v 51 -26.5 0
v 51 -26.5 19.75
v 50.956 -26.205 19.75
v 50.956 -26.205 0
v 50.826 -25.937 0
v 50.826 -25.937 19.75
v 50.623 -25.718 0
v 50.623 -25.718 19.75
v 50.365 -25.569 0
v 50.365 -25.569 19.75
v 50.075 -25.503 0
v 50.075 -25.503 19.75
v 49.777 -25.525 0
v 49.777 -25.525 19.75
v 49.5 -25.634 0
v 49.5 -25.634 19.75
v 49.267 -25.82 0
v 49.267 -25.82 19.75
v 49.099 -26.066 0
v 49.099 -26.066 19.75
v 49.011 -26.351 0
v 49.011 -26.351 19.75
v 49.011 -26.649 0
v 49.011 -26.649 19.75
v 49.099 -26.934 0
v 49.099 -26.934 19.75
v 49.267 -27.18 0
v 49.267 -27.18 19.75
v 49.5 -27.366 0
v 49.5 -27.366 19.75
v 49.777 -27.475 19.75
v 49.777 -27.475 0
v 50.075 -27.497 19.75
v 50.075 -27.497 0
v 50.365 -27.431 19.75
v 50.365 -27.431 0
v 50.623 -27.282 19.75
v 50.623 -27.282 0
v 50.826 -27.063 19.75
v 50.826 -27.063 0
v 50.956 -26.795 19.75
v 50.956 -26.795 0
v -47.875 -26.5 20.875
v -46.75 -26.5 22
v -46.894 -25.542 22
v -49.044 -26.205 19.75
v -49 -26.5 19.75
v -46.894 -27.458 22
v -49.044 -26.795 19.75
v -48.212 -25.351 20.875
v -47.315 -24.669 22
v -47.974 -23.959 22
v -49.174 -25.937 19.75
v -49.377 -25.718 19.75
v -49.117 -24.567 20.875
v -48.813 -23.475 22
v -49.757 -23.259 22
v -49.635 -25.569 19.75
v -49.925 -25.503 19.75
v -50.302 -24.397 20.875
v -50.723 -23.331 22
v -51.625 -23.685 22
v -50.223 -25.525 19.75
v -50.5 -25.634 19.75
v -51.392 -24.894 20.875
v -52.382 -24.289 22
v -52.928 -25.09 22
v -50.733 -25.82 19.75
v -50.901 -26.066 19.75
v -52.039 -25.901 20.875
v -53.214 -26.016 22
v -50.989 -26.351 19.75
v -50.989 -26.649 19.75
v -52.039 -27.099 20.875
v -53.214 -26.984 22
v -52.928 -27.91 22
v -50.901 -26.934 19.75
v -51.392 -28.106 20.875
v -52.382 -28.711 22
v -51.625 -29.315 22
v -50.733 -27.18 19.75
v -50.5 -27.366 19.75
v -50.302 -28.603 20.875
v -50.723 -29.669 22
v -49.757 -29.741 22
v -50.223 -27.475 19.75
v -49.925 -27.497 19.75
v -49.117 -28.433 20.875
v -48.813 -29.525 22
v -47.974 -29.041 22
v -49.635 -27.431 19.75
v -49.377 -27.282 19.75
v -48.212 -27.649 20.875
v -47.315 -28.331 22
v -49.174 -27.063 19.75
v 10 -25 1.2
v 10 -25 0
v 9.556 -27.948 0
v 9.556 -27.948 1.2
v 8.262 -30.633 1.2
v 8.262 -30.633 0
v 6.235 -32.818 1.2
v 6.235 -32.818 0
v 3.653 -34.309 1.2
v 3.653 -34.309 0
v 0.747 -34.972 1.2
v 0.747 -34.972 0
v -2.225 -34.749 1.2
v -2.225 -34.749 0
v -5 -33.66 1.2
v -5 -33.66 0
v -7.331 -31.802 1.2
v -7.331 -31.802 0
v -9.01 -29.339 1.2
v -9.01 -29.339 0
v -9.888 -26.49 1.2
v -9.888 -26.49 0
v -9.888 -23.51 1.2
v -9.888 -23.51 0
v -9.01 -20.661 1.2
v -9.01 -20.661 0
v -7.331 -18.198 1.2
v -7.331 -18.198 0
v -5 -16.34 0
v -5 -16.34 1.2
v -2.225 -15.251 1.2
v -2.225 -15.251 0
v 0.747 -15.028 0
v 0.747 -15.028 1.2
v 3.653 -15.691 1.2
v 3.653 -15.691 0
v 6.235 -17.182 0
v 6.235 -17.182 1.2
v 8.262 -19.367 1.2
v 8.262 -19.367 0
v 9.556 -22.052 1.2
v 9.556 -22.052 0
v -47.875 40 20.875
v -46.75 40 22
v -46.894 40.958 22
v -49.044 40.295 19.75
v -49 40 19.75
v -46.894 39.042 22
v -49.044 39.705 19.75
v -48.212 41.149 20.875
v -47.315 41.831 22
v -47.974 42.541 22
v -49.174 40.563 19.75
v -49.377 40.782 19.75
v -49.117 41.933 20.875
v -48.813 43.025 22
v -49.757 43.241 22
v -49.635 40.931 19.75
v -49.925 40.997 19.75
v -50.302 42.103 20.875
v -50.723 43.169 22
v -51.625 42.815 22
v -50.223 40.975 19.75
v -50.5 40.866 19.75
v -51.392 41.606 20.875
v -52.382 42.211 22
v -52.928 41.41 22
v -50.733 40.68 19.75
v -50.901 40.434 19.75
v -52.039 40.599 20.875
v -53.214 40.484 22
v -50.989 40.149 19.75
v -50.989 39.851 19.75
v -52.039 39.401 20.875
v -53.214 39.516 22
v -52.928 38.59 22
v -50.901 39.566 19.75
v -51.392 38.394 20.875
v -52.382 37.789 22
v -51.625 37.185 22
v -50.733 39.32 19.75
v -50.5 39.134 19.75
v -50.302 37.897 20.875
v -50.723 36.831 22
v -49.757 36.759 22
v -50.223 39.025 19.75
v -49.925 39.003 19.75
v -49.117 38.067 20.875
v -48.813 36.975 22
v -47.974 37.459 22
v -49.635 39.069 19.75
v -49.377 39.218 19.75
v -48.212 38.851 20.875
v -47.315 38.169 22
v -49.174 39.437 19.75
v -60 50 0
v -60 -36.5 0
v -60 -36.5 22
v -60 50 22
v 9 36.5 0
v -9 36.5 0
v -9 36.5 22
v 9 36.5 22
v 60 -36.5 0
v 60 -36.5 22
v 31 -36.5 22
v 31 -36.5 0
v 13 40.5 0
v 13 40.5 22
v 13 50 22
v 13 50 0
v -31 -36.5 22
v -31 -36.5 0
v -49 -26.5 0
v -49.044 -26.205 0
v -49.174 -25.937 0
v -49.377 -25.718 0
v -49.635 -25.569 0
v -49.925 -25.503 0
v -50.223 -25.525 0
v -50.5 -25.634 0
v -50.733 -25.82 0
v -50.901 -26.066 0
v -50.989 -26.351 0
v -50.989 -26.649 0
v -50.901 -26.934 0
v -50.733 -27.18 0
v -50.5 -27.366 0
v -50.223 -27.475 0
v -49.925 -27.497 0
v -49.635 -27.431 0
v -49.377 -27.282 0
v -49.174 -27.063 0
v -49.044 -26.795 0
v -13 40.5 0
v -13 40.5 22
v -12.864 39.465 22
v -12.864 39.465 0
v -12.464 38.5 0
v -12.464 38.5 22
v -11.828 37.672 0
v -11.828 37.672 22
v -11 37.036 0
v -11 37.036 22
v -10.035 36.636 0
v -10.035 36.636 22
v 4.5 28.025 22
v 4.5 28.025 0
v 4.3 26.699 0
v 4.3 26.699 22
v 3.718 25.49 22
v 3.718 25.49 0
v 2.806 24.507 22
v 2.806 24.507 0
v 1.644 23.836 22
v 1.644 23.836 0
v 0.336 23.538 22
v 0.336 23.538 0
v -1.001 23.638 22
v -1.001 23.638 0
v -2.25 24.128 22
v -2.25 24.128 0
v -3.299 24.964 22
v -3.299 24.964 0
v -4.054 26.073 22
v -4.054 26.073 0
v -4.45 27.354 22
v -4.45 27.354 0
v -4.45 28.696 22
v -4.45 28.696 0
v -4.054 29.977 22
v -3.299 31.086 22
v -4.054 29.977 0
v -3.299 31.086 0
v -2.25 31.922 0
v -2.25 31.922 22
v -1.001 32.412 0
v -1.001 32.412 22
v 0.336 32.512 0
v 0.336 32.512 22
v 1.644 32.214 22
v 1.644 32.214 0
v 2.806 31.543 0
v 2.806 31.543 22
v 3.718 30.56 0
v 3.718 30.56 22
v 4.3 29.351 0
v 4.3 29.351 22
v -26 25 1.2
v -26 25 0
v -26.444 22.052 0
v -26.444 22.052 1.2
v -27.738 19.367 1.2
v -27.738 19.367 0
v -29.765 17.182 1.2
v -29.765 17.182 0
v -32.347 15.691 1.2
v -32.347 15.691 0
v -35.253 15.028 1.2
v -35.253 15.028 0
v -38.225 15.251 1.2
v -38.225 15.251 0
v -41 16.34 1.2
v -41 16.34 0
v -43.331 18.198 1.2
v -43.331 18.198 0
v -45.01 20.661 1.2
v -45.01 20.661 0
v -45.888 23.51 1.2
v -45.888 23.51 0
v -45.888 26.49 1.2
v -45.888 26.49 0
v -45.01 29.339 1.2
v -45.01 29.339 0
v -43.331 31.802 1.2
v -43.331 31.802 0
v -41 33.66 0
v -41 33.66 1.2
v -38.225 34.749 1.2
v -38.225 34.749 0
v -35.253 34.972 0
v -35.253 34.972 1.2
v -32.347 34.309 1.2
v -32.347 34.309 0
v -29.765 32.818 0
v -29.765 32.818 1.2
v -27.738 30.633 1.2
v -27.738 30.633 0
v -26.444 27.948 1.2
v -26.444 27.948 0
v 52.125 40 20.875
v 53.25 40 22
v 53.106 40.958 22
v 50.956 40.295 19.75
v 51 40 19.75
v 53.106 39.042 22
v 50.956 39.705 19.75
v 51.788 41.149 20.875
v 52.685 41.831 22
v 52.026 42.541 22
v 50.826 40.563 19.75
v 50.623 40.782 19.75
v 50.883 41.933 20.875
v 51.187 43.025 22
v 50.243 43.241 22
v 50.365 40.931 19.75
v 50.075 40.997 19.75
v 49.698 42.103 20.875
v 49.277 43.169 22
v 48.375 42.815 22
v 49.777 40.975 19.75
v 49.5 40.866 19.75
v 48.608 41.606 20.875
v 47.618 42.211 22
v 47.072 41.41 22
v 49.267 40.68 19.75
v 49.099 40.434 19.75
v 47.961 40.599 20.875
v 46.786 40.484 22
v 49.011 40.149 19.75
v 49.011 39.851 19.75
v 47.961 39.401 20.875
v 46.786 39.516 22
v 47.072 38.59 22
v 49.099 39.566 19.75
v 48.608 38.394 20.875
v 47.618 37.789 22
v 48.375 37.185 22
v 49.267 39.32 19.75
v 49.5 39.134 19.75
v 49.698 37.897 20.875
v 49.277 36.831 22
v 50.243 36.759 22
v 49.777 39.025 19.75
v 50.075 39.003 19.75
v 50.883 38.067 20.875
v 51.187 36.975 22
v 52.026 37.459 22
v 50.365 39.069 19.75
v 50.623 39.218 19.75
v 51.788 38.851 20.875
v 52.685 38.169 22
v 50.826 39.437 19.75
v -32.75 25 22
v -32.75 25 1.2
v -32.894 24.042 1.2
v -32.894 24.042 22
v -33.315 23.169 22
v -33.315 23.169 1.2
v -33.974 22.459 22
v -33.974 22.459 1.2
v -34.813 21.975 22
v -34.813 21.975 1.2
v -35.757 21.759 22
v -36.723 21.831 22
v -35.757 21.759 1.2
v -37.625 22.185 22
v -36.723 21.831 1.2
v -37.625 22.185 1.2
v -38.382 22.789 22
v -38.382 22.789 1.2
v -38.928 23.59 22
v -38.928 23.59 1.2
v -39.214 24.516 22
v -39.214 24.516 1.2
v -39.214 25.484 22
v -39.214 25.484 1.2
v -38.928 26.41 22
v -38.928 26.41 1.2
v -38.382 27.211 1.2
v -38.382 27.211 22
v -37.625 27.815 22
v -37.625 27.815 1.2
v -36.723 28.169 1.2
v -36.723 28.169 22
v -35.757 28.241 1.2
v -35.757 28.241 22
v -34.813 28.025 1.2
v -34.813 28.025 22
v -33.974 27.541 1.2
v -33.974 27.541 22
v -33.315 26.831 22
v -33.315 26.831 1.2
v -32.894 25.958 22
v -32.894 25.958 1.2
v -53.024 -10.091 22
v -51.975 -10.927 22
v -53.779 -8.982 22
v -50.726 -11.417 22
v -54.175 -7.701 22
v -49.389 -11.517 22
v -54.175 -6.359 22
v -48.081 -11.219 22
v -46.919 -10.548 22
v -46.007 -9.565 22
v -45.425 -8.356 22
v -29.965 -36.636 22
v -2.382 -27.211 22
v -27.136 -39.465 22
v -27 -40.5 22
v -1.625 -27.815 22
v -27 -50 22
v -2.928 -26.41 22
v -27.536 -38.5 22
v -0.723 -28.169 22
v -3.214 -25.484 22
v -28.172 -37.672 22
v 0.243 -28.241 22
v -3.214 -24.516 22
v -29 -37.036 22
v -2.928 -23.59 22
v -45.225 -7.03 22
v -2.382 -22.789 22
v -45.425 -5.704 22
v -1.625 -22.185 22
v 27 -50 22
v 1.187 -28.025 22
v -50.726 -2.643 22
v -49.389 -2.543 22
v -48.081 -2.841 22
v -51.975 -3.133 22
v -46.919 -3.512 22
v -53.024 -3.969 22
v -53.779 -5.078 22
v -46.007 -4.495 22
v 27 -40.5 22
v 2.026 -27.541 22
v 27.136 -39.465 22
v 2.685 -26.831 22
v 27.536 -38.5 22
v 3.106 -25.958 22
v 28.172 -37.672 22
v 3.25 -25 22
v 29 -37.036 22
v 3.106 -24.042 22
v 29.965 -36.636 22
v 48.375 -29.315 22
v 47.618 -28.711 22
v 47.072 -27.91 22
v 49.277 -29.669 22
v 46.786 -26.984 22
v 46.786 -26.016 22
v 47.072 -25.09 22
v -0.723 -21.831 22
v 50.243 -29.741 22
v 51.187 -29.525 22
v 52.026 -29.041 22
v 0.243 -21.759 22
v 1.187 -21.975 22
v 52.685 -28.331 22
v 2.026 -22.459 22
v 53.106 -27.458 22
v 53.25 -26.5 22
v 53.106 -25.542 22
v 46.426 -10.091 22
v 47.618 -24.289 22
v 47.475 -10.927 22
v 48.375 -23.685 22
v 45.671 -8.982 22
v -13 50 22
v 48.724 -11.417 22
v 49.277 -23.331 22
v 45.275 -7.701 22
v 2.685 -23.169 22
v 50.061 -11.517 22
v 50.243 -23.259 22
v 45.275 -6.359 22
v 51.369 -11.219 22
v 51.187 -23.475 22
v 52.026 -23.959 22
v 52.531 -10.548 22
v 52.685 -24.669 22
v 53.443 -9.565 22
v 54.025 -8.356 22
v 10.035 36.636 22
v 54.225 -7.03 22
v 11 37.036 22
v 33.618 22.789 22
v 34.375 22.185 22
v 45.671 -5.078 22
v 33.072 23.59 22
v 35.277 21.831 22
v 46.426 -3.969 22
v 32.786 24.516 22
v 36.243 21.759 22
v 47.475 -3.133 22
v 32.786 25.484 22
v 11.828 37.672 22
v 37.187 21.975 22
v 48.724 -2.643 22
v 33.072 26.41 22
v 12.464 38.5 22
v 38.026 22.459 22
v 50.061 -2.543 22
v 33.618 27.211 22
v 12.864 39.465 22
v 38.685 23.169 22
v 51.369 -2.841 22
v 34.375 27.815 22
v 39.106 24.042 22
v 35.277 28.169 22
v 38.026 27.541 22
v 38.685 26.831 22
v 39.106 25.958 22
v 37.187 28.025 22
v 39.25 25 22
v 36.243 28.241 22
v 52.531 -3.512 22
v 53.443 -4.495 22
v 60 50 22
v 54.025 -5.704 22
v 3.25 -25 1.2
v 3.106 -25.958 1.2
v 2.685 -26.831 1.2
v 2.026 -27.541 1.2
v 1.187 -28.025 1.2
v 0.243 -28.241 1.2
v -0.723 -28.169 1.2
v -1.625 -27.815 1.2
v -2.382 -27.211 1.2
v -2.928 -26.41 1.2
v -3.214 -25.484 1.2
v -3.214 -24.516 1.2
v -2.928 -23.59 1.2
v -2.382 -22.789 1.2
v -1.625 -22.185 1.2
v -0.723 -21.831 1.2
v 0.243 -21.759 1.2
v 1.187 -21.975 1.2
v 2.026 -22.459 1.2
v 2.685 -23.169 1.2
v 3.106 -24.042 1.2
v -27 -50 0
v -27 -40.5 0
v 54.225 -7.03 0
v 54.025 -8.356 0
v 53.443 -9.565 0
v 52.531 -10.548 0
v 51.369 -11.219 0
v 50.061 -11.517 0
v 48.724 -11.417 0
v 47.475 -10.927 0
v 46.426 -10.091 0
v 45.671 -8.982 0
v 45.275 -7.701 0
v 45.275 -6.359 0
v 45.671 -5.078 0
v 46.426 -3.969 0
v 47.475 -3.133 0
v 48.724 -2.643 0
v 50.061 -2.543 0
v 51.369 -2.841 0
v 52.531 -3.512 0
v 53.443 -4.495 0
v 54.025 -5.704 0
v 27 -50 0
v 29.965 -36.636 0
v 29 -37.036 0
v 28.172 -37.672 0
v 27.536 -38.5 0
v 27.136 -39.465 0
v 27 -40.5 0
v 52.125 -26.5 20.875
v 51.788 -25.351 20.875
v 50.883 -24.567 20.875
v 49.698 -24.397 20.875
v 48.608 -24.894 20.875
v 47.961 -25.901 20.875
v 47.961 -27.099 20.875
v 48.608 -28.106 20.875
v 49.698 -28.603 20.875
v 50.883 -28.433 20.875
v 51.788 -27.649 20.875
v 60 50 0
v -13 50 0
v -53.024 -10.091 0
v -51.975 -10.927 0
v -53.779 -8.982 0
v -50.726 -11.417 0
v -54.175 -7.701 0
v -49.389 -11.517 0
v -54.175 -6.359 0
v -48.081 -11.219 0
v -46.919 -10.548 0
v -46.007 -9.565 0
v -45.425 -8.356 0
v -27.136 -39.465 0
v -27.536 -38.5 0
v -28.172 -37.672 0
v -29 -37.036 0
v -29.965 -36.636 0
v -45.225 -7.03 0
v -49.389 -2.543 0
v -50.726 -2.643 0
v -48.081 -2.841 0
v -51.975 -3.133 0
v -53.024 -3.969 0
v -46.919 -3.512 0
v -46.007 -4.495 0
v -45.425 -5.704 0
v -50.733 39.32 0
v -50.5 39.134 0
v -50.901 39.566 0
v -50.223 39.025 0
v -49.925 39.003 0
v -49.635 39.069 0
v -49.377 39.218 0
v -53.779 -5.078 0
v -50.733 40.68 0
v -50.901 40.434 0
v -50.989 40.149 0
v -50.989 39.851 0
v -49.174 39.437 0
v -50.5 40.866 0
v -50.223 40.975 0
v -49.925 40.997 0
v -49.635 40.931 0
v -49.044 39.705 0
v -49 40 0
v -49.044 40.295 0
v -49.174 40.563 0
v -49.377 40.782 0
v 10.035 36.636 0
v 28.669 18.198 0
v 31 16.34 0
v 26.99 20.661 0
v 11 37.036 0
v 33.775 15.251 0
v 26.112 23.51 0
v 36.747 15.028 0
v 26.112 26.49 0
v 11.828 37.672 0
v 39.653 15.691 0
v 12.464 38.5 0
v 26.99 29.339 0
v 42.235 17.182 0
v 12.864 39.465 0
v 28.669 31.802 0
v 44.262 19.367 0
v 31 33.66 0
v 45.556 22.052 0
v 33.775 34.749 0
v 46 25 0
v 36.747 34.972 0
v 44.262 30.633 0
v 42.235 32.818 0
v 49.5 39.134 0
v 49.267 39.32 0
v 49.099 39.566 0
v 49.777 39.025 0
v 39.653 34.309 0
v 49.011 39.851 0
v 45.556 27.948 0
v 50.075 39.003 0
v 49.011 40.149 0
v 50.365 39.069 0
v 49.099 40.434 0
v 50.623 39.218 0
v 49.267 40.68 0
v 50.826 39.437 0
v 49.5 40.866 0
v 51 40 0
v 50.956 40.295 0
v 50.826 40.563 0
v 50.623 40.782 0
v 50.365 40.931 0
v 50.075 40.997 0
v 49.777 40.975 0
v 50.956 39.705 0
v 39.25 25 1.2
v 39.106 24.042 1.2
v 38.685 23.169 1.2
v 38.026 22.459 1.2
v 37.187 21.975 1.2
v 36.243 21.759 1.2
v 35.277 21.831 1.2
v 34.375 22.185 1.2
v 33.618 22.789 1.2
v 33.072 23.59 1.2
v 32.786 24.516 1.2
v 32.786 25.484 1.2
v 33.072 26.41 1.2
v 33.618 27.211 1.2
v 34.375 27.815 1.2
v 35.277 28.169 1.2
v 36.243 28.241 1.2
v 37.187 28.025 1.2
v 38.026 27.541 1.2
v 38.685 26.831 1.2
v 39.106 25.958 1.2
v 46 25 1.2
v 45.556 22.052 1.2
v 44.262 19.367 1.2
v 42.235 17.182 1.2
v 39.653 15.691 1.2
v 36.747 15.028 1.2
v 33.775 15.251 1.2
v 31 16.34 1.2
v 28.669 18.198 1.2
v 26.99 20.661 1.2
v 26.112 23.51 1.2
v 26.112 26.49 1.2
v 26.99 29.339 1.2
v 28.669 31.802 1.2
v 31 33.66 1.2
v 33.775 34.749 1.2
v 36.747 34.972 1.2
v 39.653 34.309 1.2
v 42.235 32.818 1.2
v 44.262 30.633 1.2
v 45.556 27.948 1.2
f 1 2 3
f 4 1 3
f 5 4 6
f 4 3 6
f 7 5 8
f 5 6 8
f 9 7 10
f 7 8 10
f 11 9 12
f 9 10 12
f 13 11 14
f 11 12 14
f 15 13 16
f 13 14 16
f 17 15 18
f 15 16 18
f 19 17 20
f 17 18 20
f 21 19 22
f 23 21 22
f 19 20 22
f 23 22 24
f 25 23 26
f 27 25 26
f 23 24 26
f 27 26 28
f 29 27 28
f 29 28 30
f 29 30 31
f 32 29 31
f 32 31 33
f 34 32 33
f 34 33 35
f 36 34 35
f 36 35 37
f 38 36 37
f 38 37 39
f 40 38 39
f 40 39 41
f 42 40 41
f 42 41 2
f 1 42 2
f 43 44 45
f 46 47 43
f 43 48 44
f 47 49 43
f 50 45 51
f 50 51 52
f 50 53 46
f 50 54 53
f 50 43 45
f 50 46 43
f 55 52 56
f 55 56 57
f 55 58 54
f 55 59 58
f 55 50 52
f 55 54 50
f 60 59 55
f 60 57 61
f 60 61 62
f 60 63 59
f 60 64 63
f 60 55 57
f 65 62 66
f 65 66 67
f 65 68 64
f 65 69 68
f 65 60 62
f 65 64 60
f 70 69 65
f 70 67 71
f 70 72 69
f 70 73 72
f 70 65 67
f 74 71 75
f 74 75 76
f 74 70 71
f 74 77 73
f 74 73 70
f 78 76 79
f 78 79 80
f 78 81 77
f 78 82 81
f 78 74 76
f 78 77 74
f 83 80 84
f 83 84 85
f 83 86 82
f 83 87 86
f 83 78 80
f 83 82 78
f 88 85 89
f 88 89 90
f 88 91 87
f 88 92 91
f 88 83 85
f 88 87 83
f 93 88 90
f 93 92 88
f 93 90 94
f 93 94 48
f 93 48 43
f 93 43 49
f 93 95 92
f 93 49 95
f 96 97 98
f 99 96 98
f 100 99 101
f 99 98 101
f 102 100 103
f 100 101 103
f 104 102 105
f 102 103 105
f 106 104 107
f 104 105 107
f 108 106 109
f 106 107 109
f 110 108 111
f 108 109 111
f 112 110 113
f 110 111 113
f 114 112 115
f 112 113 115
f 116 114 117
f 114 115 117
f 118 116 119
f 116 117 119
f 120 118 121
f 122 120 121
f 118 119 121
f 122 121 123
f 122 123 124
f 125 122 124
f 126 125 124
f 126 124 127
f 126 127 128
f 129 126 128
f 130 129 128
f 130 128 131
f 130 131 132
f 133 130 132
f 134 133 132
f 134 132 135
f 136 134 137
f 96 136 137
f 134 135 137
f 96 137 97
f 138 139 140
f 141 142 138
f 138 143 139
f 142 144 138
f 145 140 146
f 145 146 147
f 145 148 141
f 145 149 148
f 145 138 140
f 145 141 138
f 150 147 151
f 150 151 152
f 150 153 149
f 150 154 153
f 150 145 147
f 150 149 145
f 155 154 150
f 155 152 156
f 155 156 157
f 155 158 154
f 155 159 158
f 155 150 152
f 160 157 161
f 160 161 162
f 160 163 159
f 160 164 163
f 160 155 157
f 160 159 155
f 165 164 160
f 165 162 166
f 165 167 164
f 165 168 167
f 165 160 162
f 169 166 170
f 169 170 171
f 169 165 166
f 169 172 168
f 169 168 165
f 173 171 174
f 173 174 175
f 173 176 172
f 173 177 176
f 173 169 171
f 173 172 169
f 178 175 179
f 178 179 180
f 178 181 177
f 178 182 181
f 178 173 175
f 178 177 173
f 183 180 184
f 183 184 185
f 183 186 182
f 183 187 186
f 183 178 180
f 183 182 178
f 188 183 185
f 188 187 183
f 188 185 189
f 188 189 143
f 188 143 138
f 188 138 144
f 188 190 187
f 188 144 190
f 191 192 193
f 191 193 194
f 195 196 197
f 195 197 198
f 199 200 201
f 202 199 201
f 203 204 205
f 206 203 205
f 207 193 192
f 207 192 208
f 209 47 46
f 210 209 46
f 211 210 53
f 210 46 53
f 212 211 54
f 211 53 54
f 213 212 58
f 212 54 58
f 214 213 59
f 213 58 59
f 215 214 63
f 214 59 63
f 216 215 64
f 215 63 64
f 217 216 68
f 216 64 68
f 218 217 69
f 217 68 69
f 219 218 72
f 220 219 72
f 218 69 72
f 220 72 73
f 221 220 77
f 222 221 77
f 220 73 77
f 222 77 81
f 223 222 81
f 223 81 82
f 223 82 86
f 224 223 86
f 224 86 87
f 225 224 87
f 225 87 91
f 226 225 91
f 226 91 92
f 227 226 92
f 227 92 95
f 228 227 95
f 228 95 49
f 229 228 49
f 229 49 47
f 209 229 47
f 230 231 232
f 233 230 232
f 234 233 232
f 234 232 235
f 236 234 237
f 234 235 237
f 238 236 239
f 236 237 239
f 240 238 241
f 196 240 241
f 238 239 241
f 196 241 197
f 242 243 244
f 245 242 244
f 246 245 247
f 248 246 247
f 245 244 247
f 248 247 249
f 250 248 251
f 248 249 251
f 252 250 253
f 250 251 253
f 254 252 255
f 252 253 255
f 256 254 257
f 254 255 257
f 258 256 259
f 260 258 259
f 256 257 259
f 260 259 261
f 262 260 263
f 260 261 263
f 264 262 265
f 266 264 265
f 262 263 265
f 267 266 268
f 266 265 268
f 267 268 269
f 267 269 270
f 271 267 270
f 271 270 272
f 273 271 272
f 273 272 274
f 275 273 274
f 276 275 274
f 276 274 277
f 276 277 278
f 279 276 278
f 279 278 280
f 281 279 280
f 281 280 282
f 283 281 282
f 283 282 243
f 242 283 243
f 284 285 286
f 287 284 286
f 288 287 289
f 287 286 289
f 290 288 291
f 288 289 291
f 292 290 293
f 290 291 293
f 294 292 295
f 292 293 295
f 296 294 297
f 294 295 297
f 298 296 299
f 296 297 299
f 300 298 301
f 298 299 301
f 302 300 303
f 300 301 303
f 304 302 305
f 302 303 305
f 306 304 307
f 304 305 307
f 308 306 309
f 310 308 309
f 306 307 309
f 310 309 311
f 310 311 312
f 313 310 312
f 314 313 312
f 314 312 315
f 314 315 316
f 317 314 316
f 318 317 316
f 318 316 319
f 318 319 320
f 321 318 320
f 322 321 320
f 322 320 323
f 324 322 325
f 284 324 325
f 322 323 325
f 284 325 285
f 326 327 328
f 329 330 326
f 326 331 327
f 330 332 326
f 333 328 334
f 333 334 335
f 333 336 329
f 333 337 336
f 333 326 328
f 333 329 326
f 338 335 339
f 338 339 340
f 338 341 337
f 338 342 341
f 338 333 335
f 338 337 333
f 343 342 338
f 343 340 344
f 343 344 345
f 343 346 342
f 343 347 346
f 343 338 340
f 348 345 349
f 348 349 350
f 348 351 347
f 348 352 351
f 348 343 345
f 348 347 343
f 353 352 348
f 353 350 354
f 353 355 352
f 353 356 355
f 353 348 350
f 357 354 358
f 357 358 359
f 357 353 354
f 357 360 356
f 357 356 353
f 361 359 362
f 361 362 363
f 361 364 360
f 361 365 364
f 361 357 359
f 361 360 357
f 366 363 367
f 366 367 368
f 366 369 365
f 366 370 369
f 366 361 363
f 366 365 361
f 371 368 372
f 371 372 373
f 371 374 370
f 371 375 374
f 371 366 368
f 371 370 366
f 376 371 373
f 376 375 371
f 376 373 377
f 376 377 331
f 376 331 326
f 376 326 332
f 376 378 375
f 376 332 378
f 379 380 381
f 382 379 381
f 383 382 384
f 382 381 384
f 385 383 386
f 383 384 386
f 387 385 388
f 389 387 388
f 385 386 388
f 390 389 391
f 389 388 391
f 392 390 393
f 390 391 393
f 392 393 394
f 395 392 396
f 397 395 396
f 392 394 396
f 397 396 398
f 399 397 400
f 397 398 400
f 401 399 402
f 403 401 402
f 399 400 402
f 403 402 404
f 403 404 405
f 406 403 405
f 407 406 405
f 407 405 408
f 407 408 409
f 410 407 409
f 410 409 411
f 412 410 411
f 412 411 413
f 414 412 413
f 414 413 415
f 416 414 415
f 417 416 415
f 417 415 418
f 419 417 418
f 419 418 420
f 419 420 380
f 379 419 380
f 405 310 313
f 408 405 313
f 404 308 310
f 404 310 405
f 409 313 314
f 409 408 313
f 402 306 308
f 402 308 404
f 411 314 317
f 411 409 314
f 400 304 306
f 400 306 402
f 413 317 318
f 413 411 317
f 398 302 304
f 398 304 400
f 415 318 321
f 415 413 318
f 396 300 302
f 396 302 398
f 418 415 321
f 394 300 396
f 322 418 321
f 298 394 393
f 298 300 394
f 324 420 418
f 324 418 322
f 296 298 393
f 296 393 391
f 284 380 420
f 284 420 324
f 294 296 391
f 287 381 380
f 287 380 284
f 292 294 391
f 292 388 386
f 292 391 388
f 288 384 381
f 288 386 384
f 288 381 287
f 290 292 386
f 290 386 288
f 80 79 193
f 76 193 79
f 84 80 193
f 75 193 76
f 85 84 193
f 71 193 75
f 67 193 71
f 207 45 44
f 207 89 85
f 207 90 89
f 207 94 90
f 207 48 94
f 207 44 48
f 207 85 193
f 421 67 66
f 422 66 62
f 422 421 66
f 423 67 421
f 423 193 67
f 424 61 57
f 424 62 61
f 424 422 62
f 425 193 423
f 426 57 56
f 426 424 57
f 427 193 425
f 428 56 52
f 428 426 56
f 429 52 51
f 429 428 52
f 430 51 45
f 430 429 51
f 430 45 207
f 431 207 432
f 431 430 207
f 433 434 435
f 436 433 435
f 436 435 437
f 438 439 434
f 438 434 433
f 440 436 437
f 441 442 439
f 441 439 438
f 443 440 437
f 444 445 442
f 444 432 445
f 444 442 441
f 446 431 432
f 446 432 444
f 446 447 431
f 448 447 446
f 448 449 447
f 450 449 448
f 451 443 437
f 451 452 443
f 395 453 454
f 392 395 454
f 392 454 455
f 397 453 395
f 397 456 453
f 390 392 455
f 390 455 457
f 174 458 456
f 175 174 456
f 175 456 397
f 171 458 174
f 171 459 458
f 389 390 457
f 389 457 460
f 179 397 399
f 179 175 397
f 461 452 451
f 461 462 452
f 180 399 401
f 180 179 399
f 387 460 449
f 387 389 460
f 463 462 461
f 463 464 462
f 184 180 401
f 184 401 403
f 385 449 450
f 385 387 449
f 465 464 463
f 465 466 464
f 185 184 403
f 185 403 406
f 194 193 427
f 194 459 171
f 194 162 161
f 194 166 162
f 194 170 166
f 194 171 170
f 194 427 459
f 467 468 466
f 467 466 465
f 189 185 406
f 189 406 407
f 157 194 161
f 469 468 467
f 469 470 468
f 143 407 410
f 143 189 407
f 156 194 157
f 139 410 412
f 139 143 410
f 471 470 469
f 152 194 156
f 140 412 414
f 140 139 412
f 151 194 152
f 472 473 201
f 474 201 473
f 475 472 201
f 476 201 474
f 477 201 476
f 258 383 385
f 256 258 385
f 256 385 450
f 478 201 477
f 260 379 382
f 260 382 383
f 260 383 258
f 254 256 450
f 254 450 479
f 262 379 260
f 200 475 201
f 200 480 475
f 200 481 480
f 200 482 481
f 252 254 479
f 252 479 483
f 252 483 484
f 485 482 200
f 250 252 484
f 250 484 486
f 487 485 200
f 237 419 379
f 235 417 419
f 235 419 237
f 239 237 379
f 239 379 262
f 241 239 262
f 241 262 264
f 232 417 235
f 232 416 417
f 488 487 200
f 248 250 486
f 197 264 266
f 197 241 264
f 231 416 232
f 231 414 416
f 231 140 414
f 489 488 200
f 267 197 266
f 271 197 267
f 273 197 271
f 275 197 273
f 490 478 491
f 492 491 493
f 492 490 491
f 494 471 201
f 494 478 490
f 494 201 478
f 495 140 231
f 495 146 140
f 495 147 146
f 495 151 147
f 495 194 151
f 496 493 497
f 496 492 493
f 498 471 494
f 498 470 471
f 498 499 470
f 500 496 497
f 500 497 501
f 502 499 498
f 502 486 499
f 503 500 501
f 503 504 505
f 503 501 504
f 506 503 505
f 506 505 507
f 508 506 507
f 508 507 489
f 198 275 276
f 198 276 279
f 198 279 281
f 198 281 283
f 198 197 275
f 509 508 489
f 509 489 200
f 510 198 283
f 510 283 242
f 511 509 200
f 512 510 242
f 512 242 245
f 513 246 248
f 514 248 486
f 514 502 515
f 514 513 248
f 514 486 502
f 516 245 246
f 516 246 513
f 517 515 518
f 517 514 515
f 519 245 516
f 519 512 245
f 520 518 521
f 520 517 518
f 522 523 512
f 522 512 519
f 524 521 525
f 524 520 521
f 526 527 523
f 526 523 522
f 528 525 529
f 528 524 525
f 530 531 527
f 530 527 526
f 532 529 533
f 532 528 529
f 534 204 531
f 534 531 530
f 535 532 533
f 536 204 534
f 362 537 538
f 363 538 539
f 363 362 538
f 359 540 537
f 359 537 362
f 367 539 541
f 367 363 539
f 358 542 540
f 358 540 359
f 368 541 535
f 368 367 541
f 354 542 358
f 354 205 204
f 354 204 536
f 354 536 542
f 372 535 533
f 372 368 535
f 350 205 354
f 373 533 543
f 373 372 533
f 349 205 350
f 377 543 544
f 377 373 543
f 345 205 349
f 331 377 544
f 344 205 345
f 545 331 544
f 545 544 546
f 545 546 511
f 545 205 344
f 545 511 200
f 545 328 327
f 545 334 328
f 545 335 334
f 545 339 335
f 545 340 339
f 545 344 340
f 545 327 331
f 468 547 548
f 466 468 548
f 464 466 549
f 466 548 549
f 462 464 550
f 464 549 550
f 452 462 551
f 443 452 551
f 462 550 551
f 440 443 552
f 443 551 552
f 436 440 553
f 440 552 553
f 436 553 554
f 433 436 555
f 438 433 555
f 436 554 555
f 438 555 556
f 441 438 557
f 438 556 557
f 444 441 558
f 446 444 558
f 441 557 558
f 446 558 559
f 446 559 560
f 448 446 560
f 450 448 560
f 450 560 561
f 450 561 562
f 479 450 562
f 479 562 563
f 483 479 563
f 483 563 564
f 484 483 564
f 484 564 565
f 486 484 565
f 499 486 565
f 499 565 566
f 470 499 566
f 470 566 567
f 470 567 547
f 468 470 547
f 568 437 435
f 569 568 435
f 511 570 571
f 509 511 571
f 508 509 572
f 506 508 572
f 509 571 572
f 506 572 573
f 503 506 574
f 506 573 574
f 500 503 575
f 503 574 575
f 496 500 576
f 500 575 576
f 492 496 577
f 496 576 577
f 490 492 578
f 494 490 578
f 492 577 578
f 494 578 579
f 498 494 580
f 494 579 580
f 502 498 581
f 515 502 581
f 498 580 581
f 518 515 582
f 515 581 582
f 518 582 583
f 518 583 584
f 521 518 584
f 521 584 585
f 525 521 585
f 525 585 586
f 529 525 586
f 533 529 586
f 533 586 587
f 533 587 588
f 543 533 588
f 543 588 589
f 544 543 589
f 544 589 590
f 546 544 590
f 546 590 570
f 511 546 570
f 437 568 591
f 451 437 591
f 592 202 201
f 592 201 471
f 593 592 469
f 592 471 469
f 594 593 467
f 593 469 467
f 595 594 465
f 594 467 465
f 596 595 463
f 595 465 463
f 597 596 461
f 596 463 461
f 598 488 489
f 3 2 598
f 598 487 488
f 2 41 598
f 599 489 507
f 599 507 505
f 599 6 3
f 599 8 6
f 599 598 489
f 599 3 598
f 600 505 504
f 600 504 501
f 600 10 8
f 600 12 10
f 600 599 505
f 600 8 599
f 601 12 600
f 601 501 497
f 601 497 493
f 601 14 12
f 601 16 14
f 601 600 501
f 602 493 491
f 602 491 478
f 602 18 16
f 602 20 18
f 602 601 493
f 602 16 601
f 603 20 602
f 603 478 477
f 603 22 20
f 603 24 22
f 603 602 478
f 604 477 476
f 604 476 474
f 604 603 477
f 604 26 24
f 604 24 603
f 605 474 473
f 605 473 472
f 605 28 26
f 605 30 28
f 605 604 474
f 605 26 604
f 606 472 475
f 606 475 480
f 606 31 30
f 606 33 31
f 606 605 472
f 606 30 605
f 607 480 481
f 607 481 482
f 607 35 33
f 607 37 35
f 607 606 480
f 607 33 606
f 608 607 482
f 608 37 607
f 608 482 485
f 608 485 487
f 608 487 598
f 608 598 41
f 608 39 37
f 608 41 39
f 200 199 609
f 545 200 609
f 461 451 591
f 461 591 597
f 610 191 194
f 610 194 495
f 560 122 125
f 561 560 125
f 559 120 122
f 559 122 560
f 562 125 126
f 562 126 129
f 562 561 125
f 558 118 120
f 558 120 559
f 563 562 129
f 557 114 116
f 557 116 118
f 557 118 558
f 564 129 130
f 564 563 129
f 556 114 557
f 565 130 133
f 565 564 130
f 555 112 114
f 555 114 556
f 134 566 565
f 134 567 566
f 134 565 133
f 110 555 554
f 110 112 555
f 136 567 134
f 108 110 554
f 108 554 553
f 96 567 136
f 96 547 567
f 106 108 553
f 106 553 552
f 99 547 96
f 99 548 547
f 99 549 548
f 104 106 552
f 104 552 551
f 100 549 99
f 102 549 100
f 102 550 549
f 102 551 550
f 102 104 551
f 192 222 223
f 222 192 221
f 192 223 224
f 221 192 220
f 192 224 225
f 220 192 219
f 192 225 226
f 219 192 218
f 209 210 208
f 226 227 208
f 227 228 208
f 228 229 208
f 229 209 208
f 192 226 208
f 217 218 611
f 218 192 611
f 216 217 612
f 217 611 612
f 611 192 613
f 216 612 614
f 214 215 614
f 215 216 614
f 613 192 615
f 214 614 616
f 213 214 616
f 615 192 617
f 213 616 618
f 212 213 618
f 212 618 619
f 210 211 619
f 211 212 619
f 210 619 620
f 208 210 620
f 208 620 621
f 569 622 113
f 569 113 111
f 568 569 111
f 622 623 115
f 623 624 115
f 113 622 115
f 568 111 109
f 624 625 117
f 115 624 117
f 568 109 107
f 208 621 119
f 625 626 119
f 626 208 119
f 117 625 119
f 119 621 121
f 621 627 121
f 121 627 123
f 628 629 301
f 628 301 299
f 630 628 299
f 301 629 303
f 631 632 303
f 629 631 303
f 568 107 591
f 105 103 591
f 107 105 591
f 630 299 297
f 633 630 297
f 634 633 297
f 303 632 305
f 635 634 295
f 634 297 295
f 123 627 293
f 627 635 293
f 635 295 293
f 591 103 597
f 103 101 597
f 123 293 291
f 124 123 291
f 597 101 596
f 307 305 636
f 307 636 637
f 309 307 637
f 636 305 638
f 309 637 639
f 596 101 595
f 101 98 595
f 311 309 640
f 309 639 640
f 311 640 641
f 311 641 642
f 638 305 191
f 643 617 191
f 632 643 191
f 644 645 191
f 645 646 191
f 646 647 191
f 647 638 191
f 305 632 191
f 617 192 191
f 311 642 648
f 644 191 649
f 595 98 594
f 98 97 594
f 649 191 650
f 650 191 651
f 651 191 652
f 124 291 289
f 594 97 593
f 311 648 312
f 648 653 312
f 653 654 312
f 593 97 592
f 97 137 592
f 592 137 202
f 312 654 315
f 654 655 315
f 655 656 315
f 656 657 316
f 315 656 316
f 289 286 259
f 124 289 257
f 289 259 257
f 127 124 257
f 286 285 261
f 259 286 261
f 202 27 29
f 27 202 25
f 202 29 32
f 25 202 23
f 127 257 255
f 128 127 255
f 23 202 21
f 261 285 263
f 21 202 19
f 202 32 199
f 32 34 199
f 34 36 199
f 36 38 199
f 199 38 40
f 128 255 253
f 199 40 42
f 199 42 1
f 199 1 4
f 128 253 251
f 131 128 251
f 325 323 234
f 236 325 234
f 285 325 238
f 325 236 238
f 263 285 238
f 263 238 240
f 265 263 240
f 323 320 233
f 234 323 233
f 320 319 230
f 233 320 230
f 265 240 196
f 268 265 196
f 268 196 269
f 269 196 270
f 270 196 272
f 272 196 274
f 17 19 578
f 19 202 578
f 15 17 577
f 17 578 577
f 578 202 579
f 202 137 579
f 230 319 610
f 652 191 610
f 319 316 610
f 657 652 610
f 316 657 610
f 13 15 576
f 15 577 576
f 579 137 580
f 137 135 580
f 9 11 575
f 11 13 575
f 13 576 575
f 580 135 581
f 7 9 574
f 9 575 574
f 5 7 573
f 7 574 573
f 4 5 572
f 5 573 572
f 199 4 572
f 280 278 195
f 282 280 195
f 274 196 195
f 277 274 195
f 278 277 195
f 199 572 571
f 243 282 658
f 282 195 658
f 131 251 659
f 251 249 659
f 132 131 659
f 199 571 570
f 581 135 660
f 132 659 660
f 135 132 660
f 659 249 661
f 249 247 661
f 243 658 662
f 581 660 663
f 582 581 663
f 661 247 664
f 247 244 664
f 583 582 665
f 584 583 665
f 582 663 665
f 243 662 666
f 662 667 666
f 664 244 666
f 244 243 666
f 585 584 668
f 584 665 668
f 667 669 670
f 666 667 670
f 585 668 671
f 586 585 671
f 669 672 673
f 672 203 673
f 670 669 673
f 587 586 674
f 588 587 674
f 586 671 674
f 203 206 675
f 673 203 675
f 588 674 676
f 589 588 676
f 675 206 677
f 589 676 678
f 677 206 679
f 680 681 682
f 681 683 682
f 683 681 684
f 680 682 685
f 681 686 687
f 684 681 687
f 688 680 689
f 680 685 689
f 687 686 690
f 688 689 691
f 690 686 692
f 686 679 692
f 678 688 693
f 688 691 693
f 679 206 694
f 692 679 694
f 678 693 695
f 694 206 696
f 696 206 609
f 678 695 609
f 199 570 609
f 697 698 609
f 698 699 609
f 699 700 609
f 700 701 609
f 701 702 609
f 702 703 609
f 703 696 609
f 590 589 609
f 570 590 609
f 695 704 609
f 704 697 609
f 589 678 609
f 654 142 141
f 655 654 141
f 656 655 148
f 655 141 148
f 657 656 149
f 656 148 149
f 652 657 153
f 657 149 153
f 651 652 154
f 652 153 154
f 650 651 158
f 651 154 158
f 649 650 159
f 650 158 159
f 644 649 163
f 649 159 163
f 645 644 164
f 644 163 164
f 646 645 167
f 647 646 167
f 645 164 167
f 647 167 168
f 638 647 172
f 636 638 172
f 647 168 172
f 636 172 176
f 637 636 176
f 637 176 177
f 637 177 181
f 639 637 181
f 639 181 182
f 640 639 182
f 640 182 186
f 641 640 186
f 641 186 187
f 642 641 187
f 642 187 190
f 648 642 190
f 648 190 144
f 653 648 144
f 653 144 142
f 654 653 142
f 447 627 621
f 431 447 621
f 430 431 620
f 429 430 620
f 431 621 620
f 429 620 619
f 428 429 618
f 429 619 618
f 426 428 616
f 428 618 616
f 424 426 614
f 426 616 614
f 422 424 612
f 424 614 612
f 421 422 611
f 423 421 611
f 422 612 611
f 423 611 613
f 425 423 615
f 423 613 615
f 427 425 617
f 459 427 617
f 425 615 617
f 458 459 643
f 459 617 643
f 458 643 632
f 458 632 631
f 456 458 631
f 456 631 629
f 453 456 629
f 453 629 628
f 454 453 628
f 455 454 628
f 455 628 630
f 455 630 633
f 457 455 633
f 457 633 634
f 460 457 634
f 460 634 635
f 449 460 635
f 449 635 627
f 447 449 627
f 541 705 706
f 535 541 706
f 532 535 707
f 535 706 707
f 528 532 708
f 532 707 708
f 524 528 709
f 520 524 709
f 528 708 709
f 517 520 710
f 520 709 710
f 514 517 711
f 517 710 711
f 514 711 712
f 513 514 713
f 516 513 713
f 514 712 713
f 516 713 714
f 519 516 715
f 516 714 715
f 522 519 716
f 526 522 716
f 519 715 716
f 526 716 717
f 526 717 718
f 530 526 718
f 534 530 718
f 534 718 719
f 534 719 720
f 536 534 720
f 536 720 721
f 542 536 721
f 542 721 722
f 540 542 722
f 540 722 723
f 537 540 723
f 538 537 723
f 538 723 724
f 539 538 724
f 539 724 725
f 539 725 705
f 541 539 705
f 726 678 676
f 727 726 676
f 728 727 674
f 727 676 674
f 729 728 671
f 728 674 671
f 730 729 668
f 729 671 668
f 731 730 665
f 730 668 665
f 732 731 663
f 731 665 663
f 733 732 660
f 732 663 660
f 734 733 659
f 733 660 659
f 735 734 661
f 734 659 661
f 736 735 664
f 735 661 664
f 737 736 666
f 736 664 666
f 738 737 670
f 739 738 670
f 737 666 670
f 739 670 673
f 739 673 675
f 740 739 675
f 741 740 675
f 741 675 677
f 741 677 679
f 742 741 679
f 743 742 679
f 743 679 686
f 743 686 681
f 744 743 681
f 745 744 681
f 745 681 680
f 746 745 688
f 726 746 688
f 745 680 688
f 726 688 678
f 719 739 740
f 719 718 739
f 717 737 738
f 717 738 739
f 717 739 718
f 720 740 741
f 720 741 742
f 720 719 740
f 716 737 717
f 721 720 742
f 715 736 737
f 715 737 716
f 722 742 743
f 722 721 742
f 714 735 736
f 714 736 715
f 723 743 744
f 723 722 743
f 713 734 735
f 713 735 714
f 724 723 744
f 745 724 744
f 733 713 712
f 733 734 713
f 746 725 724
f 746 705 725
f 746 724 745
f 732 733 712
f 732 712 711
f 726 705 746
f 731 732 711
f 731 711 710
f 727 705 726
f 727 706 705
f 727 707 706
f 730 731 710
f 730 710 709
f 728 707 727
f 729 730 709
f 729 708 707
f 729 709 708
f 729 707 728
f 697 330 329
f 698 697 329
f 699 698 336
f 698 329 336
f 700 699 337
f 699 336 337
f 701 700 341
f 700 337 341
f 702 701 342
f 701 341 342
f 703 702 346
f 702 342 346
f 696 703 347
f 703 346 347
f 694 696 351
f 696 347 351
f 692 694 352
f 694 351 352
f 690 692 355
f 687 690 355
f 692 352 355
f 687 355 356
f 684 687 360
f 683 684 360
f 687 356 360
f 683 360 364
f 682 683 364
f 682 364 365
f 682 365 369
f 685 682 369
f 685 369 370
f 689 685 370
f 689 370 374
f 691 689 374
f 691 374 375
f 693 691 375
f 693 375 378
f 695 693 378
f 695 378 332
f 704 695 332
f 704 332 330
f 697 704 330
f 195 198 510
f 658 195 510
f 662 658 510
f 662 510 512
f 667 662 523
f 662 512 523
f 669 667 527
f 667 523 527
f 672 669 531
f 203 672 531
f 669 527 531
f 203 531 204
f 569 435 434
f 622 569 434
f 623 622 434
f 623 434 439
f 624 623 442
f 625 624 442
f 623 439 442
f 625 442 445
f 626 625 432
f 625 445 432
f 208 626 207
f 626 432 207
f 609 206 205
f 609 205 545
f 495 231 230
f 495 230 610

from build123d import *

# Parameters (mm, degrees)
SKETCH_W        = 120
SKETCH_H        = 100
PAD_DEPTH       = 22
SKETCH001_R     = 4.5
POCKET_DEPTH    = 22.001
POCKET001_DEPTH = 22.001
SKETCH003_R     = 1
POCKET002_DEPTH = 22.001
SKETCH004_R     = 10
POCKET003_DEPTH = 1.2
SKETCH005_R     = 3.25
POCKET004_DEPTH = 20.801
CHAMFER_SIZE    = 2.25


with BuildPart() as part:
    # Sketch → Pad (new body)
    with BuildSketch(Plane.XY):
        Rectangle(SKETCH_W, SKETCH_H)
    extrude(amount=PAD_DEPTH)

    # Sketch001 → Pocket (cut, through all)
    with BuildSketch(Plane(origin=(0, 0, 0), x_dir=(1, 0, 0), z_dir=(0, 0, -1))):
        with Locations((-49.725, 7.03)):
            Circle(SKETCH001_R)
        with Locations((0, -28.025)):
            Circle(SKETCH001_R)
        with Locations((49.725, 7.03)):
            Circle(SKETCH001_R)
    extrude(amount=-POCKET_DEPTH, mode=Mode.SUBTRACT)

    # Sketch002 → Pocket001 (cut, through all)
    with BuildSketch(Plane.XY.offset(22)):
        with BuildLine():
            Line((-60, -50), (-60, -36.5))
            Line((-60, -36.5), (-31, -36.5))
            ThreePointArc((-27, -40.5), (-28.171573, -37.671573), (-31, -36.5))
            Line((-27, -50), (-27, -40.5))
            Line((-27, -50), (-60, -50))
        make_face()
        with BuildLine():
            Line((60, -36.5), (60, -50))
            Line((60, -50), (27, -50))
            Line((27, -50), (27, -40.500015))
            ThreePointArc((31, -36.5), (28.171568, -37.671578), (27, -40.500015))
            Line((60, -36.5), (31, -36.5))
        make_face()
        with BuildLine():
            Line((13, 50), (-13, 50))
            Line((-13, 40.5), (-13, 50))
            ThreePointArc((-13, 40.5), (-11.828427, 37.671573), (-9, 36.5))
            Line((-9, 36.5), (9, 36.5))
            ThreePointArc((9, 36.5), (11.828427, 37.671573), (13, 40.5))
            Line((13, 40.5), (13, 50))
        make_face()
    extrude(amount=-POCKET001_DEPTH, mode=Mode.SUBTRACT)

    # Sketch003 → Pocket002 (cut, through all)
    with BuildSketch(Plane.XY.offset(22)):
        with Locations((50, -26.5)):
            Circle(SKETCH003_R)
        with Locations((-50, -26.5)):
            Circle(SKETCH003_R)
        with Locations((50, 40)):
            Circle(SKETCH003_R)
        with Locations((-50, 40)):
            Circle(SKETCH003_R)
    extrude(amount=-POCKET002_DEPTH, mode=Mode.SUBTRACT)

    # Sketch004 → Pocket003 (cut)
    with BuildSketch(Plane(origin=(0, 0, 0), x_dir=(1, 0, 0), z_dir=(0, 0, -1))):
        with Locations((0, 25)):
            Circle(SKETCH004_R)
        with Locations((-36, -25)):
            Circle(SKETCH004_R)
        with Locations((36, -25)):
            Circle(SKETCH004_R)
    extrude(amount=-POCKET003_DEPTH, mode=Mode.SUBTRACT)

    # Sketch005 → Pocket004 (cut, through all)
    with BuildSketch(Plane(origin=(0, 0, 1.2), x_dir=(1, 0, 0), z_dir=(0, 0, -1))):
        with Locations((0, 25)):
            Circle(SKETCH005_R)
        with Locations((36, -25)):
            Circle(SKETCH005_R)
        with Locations((-36, -25)):
            Circle(SKETCH005_R)
    extrude(amount=-POCKET004_DEPTH, mode=Mode.SUBTRACT)

    # Chamfer
    chamfer_edges = [part.edges().sort_by_distance(p)[0] for p in [
        (49, 40, 22),
        (49, -26.5, 22),
        (-51, -26.5, 22),
        (-51, 40, 22),
    ]]
    chamfer(chamfer_edges, length=CHAMFER_SIZE)


solid = part.part
